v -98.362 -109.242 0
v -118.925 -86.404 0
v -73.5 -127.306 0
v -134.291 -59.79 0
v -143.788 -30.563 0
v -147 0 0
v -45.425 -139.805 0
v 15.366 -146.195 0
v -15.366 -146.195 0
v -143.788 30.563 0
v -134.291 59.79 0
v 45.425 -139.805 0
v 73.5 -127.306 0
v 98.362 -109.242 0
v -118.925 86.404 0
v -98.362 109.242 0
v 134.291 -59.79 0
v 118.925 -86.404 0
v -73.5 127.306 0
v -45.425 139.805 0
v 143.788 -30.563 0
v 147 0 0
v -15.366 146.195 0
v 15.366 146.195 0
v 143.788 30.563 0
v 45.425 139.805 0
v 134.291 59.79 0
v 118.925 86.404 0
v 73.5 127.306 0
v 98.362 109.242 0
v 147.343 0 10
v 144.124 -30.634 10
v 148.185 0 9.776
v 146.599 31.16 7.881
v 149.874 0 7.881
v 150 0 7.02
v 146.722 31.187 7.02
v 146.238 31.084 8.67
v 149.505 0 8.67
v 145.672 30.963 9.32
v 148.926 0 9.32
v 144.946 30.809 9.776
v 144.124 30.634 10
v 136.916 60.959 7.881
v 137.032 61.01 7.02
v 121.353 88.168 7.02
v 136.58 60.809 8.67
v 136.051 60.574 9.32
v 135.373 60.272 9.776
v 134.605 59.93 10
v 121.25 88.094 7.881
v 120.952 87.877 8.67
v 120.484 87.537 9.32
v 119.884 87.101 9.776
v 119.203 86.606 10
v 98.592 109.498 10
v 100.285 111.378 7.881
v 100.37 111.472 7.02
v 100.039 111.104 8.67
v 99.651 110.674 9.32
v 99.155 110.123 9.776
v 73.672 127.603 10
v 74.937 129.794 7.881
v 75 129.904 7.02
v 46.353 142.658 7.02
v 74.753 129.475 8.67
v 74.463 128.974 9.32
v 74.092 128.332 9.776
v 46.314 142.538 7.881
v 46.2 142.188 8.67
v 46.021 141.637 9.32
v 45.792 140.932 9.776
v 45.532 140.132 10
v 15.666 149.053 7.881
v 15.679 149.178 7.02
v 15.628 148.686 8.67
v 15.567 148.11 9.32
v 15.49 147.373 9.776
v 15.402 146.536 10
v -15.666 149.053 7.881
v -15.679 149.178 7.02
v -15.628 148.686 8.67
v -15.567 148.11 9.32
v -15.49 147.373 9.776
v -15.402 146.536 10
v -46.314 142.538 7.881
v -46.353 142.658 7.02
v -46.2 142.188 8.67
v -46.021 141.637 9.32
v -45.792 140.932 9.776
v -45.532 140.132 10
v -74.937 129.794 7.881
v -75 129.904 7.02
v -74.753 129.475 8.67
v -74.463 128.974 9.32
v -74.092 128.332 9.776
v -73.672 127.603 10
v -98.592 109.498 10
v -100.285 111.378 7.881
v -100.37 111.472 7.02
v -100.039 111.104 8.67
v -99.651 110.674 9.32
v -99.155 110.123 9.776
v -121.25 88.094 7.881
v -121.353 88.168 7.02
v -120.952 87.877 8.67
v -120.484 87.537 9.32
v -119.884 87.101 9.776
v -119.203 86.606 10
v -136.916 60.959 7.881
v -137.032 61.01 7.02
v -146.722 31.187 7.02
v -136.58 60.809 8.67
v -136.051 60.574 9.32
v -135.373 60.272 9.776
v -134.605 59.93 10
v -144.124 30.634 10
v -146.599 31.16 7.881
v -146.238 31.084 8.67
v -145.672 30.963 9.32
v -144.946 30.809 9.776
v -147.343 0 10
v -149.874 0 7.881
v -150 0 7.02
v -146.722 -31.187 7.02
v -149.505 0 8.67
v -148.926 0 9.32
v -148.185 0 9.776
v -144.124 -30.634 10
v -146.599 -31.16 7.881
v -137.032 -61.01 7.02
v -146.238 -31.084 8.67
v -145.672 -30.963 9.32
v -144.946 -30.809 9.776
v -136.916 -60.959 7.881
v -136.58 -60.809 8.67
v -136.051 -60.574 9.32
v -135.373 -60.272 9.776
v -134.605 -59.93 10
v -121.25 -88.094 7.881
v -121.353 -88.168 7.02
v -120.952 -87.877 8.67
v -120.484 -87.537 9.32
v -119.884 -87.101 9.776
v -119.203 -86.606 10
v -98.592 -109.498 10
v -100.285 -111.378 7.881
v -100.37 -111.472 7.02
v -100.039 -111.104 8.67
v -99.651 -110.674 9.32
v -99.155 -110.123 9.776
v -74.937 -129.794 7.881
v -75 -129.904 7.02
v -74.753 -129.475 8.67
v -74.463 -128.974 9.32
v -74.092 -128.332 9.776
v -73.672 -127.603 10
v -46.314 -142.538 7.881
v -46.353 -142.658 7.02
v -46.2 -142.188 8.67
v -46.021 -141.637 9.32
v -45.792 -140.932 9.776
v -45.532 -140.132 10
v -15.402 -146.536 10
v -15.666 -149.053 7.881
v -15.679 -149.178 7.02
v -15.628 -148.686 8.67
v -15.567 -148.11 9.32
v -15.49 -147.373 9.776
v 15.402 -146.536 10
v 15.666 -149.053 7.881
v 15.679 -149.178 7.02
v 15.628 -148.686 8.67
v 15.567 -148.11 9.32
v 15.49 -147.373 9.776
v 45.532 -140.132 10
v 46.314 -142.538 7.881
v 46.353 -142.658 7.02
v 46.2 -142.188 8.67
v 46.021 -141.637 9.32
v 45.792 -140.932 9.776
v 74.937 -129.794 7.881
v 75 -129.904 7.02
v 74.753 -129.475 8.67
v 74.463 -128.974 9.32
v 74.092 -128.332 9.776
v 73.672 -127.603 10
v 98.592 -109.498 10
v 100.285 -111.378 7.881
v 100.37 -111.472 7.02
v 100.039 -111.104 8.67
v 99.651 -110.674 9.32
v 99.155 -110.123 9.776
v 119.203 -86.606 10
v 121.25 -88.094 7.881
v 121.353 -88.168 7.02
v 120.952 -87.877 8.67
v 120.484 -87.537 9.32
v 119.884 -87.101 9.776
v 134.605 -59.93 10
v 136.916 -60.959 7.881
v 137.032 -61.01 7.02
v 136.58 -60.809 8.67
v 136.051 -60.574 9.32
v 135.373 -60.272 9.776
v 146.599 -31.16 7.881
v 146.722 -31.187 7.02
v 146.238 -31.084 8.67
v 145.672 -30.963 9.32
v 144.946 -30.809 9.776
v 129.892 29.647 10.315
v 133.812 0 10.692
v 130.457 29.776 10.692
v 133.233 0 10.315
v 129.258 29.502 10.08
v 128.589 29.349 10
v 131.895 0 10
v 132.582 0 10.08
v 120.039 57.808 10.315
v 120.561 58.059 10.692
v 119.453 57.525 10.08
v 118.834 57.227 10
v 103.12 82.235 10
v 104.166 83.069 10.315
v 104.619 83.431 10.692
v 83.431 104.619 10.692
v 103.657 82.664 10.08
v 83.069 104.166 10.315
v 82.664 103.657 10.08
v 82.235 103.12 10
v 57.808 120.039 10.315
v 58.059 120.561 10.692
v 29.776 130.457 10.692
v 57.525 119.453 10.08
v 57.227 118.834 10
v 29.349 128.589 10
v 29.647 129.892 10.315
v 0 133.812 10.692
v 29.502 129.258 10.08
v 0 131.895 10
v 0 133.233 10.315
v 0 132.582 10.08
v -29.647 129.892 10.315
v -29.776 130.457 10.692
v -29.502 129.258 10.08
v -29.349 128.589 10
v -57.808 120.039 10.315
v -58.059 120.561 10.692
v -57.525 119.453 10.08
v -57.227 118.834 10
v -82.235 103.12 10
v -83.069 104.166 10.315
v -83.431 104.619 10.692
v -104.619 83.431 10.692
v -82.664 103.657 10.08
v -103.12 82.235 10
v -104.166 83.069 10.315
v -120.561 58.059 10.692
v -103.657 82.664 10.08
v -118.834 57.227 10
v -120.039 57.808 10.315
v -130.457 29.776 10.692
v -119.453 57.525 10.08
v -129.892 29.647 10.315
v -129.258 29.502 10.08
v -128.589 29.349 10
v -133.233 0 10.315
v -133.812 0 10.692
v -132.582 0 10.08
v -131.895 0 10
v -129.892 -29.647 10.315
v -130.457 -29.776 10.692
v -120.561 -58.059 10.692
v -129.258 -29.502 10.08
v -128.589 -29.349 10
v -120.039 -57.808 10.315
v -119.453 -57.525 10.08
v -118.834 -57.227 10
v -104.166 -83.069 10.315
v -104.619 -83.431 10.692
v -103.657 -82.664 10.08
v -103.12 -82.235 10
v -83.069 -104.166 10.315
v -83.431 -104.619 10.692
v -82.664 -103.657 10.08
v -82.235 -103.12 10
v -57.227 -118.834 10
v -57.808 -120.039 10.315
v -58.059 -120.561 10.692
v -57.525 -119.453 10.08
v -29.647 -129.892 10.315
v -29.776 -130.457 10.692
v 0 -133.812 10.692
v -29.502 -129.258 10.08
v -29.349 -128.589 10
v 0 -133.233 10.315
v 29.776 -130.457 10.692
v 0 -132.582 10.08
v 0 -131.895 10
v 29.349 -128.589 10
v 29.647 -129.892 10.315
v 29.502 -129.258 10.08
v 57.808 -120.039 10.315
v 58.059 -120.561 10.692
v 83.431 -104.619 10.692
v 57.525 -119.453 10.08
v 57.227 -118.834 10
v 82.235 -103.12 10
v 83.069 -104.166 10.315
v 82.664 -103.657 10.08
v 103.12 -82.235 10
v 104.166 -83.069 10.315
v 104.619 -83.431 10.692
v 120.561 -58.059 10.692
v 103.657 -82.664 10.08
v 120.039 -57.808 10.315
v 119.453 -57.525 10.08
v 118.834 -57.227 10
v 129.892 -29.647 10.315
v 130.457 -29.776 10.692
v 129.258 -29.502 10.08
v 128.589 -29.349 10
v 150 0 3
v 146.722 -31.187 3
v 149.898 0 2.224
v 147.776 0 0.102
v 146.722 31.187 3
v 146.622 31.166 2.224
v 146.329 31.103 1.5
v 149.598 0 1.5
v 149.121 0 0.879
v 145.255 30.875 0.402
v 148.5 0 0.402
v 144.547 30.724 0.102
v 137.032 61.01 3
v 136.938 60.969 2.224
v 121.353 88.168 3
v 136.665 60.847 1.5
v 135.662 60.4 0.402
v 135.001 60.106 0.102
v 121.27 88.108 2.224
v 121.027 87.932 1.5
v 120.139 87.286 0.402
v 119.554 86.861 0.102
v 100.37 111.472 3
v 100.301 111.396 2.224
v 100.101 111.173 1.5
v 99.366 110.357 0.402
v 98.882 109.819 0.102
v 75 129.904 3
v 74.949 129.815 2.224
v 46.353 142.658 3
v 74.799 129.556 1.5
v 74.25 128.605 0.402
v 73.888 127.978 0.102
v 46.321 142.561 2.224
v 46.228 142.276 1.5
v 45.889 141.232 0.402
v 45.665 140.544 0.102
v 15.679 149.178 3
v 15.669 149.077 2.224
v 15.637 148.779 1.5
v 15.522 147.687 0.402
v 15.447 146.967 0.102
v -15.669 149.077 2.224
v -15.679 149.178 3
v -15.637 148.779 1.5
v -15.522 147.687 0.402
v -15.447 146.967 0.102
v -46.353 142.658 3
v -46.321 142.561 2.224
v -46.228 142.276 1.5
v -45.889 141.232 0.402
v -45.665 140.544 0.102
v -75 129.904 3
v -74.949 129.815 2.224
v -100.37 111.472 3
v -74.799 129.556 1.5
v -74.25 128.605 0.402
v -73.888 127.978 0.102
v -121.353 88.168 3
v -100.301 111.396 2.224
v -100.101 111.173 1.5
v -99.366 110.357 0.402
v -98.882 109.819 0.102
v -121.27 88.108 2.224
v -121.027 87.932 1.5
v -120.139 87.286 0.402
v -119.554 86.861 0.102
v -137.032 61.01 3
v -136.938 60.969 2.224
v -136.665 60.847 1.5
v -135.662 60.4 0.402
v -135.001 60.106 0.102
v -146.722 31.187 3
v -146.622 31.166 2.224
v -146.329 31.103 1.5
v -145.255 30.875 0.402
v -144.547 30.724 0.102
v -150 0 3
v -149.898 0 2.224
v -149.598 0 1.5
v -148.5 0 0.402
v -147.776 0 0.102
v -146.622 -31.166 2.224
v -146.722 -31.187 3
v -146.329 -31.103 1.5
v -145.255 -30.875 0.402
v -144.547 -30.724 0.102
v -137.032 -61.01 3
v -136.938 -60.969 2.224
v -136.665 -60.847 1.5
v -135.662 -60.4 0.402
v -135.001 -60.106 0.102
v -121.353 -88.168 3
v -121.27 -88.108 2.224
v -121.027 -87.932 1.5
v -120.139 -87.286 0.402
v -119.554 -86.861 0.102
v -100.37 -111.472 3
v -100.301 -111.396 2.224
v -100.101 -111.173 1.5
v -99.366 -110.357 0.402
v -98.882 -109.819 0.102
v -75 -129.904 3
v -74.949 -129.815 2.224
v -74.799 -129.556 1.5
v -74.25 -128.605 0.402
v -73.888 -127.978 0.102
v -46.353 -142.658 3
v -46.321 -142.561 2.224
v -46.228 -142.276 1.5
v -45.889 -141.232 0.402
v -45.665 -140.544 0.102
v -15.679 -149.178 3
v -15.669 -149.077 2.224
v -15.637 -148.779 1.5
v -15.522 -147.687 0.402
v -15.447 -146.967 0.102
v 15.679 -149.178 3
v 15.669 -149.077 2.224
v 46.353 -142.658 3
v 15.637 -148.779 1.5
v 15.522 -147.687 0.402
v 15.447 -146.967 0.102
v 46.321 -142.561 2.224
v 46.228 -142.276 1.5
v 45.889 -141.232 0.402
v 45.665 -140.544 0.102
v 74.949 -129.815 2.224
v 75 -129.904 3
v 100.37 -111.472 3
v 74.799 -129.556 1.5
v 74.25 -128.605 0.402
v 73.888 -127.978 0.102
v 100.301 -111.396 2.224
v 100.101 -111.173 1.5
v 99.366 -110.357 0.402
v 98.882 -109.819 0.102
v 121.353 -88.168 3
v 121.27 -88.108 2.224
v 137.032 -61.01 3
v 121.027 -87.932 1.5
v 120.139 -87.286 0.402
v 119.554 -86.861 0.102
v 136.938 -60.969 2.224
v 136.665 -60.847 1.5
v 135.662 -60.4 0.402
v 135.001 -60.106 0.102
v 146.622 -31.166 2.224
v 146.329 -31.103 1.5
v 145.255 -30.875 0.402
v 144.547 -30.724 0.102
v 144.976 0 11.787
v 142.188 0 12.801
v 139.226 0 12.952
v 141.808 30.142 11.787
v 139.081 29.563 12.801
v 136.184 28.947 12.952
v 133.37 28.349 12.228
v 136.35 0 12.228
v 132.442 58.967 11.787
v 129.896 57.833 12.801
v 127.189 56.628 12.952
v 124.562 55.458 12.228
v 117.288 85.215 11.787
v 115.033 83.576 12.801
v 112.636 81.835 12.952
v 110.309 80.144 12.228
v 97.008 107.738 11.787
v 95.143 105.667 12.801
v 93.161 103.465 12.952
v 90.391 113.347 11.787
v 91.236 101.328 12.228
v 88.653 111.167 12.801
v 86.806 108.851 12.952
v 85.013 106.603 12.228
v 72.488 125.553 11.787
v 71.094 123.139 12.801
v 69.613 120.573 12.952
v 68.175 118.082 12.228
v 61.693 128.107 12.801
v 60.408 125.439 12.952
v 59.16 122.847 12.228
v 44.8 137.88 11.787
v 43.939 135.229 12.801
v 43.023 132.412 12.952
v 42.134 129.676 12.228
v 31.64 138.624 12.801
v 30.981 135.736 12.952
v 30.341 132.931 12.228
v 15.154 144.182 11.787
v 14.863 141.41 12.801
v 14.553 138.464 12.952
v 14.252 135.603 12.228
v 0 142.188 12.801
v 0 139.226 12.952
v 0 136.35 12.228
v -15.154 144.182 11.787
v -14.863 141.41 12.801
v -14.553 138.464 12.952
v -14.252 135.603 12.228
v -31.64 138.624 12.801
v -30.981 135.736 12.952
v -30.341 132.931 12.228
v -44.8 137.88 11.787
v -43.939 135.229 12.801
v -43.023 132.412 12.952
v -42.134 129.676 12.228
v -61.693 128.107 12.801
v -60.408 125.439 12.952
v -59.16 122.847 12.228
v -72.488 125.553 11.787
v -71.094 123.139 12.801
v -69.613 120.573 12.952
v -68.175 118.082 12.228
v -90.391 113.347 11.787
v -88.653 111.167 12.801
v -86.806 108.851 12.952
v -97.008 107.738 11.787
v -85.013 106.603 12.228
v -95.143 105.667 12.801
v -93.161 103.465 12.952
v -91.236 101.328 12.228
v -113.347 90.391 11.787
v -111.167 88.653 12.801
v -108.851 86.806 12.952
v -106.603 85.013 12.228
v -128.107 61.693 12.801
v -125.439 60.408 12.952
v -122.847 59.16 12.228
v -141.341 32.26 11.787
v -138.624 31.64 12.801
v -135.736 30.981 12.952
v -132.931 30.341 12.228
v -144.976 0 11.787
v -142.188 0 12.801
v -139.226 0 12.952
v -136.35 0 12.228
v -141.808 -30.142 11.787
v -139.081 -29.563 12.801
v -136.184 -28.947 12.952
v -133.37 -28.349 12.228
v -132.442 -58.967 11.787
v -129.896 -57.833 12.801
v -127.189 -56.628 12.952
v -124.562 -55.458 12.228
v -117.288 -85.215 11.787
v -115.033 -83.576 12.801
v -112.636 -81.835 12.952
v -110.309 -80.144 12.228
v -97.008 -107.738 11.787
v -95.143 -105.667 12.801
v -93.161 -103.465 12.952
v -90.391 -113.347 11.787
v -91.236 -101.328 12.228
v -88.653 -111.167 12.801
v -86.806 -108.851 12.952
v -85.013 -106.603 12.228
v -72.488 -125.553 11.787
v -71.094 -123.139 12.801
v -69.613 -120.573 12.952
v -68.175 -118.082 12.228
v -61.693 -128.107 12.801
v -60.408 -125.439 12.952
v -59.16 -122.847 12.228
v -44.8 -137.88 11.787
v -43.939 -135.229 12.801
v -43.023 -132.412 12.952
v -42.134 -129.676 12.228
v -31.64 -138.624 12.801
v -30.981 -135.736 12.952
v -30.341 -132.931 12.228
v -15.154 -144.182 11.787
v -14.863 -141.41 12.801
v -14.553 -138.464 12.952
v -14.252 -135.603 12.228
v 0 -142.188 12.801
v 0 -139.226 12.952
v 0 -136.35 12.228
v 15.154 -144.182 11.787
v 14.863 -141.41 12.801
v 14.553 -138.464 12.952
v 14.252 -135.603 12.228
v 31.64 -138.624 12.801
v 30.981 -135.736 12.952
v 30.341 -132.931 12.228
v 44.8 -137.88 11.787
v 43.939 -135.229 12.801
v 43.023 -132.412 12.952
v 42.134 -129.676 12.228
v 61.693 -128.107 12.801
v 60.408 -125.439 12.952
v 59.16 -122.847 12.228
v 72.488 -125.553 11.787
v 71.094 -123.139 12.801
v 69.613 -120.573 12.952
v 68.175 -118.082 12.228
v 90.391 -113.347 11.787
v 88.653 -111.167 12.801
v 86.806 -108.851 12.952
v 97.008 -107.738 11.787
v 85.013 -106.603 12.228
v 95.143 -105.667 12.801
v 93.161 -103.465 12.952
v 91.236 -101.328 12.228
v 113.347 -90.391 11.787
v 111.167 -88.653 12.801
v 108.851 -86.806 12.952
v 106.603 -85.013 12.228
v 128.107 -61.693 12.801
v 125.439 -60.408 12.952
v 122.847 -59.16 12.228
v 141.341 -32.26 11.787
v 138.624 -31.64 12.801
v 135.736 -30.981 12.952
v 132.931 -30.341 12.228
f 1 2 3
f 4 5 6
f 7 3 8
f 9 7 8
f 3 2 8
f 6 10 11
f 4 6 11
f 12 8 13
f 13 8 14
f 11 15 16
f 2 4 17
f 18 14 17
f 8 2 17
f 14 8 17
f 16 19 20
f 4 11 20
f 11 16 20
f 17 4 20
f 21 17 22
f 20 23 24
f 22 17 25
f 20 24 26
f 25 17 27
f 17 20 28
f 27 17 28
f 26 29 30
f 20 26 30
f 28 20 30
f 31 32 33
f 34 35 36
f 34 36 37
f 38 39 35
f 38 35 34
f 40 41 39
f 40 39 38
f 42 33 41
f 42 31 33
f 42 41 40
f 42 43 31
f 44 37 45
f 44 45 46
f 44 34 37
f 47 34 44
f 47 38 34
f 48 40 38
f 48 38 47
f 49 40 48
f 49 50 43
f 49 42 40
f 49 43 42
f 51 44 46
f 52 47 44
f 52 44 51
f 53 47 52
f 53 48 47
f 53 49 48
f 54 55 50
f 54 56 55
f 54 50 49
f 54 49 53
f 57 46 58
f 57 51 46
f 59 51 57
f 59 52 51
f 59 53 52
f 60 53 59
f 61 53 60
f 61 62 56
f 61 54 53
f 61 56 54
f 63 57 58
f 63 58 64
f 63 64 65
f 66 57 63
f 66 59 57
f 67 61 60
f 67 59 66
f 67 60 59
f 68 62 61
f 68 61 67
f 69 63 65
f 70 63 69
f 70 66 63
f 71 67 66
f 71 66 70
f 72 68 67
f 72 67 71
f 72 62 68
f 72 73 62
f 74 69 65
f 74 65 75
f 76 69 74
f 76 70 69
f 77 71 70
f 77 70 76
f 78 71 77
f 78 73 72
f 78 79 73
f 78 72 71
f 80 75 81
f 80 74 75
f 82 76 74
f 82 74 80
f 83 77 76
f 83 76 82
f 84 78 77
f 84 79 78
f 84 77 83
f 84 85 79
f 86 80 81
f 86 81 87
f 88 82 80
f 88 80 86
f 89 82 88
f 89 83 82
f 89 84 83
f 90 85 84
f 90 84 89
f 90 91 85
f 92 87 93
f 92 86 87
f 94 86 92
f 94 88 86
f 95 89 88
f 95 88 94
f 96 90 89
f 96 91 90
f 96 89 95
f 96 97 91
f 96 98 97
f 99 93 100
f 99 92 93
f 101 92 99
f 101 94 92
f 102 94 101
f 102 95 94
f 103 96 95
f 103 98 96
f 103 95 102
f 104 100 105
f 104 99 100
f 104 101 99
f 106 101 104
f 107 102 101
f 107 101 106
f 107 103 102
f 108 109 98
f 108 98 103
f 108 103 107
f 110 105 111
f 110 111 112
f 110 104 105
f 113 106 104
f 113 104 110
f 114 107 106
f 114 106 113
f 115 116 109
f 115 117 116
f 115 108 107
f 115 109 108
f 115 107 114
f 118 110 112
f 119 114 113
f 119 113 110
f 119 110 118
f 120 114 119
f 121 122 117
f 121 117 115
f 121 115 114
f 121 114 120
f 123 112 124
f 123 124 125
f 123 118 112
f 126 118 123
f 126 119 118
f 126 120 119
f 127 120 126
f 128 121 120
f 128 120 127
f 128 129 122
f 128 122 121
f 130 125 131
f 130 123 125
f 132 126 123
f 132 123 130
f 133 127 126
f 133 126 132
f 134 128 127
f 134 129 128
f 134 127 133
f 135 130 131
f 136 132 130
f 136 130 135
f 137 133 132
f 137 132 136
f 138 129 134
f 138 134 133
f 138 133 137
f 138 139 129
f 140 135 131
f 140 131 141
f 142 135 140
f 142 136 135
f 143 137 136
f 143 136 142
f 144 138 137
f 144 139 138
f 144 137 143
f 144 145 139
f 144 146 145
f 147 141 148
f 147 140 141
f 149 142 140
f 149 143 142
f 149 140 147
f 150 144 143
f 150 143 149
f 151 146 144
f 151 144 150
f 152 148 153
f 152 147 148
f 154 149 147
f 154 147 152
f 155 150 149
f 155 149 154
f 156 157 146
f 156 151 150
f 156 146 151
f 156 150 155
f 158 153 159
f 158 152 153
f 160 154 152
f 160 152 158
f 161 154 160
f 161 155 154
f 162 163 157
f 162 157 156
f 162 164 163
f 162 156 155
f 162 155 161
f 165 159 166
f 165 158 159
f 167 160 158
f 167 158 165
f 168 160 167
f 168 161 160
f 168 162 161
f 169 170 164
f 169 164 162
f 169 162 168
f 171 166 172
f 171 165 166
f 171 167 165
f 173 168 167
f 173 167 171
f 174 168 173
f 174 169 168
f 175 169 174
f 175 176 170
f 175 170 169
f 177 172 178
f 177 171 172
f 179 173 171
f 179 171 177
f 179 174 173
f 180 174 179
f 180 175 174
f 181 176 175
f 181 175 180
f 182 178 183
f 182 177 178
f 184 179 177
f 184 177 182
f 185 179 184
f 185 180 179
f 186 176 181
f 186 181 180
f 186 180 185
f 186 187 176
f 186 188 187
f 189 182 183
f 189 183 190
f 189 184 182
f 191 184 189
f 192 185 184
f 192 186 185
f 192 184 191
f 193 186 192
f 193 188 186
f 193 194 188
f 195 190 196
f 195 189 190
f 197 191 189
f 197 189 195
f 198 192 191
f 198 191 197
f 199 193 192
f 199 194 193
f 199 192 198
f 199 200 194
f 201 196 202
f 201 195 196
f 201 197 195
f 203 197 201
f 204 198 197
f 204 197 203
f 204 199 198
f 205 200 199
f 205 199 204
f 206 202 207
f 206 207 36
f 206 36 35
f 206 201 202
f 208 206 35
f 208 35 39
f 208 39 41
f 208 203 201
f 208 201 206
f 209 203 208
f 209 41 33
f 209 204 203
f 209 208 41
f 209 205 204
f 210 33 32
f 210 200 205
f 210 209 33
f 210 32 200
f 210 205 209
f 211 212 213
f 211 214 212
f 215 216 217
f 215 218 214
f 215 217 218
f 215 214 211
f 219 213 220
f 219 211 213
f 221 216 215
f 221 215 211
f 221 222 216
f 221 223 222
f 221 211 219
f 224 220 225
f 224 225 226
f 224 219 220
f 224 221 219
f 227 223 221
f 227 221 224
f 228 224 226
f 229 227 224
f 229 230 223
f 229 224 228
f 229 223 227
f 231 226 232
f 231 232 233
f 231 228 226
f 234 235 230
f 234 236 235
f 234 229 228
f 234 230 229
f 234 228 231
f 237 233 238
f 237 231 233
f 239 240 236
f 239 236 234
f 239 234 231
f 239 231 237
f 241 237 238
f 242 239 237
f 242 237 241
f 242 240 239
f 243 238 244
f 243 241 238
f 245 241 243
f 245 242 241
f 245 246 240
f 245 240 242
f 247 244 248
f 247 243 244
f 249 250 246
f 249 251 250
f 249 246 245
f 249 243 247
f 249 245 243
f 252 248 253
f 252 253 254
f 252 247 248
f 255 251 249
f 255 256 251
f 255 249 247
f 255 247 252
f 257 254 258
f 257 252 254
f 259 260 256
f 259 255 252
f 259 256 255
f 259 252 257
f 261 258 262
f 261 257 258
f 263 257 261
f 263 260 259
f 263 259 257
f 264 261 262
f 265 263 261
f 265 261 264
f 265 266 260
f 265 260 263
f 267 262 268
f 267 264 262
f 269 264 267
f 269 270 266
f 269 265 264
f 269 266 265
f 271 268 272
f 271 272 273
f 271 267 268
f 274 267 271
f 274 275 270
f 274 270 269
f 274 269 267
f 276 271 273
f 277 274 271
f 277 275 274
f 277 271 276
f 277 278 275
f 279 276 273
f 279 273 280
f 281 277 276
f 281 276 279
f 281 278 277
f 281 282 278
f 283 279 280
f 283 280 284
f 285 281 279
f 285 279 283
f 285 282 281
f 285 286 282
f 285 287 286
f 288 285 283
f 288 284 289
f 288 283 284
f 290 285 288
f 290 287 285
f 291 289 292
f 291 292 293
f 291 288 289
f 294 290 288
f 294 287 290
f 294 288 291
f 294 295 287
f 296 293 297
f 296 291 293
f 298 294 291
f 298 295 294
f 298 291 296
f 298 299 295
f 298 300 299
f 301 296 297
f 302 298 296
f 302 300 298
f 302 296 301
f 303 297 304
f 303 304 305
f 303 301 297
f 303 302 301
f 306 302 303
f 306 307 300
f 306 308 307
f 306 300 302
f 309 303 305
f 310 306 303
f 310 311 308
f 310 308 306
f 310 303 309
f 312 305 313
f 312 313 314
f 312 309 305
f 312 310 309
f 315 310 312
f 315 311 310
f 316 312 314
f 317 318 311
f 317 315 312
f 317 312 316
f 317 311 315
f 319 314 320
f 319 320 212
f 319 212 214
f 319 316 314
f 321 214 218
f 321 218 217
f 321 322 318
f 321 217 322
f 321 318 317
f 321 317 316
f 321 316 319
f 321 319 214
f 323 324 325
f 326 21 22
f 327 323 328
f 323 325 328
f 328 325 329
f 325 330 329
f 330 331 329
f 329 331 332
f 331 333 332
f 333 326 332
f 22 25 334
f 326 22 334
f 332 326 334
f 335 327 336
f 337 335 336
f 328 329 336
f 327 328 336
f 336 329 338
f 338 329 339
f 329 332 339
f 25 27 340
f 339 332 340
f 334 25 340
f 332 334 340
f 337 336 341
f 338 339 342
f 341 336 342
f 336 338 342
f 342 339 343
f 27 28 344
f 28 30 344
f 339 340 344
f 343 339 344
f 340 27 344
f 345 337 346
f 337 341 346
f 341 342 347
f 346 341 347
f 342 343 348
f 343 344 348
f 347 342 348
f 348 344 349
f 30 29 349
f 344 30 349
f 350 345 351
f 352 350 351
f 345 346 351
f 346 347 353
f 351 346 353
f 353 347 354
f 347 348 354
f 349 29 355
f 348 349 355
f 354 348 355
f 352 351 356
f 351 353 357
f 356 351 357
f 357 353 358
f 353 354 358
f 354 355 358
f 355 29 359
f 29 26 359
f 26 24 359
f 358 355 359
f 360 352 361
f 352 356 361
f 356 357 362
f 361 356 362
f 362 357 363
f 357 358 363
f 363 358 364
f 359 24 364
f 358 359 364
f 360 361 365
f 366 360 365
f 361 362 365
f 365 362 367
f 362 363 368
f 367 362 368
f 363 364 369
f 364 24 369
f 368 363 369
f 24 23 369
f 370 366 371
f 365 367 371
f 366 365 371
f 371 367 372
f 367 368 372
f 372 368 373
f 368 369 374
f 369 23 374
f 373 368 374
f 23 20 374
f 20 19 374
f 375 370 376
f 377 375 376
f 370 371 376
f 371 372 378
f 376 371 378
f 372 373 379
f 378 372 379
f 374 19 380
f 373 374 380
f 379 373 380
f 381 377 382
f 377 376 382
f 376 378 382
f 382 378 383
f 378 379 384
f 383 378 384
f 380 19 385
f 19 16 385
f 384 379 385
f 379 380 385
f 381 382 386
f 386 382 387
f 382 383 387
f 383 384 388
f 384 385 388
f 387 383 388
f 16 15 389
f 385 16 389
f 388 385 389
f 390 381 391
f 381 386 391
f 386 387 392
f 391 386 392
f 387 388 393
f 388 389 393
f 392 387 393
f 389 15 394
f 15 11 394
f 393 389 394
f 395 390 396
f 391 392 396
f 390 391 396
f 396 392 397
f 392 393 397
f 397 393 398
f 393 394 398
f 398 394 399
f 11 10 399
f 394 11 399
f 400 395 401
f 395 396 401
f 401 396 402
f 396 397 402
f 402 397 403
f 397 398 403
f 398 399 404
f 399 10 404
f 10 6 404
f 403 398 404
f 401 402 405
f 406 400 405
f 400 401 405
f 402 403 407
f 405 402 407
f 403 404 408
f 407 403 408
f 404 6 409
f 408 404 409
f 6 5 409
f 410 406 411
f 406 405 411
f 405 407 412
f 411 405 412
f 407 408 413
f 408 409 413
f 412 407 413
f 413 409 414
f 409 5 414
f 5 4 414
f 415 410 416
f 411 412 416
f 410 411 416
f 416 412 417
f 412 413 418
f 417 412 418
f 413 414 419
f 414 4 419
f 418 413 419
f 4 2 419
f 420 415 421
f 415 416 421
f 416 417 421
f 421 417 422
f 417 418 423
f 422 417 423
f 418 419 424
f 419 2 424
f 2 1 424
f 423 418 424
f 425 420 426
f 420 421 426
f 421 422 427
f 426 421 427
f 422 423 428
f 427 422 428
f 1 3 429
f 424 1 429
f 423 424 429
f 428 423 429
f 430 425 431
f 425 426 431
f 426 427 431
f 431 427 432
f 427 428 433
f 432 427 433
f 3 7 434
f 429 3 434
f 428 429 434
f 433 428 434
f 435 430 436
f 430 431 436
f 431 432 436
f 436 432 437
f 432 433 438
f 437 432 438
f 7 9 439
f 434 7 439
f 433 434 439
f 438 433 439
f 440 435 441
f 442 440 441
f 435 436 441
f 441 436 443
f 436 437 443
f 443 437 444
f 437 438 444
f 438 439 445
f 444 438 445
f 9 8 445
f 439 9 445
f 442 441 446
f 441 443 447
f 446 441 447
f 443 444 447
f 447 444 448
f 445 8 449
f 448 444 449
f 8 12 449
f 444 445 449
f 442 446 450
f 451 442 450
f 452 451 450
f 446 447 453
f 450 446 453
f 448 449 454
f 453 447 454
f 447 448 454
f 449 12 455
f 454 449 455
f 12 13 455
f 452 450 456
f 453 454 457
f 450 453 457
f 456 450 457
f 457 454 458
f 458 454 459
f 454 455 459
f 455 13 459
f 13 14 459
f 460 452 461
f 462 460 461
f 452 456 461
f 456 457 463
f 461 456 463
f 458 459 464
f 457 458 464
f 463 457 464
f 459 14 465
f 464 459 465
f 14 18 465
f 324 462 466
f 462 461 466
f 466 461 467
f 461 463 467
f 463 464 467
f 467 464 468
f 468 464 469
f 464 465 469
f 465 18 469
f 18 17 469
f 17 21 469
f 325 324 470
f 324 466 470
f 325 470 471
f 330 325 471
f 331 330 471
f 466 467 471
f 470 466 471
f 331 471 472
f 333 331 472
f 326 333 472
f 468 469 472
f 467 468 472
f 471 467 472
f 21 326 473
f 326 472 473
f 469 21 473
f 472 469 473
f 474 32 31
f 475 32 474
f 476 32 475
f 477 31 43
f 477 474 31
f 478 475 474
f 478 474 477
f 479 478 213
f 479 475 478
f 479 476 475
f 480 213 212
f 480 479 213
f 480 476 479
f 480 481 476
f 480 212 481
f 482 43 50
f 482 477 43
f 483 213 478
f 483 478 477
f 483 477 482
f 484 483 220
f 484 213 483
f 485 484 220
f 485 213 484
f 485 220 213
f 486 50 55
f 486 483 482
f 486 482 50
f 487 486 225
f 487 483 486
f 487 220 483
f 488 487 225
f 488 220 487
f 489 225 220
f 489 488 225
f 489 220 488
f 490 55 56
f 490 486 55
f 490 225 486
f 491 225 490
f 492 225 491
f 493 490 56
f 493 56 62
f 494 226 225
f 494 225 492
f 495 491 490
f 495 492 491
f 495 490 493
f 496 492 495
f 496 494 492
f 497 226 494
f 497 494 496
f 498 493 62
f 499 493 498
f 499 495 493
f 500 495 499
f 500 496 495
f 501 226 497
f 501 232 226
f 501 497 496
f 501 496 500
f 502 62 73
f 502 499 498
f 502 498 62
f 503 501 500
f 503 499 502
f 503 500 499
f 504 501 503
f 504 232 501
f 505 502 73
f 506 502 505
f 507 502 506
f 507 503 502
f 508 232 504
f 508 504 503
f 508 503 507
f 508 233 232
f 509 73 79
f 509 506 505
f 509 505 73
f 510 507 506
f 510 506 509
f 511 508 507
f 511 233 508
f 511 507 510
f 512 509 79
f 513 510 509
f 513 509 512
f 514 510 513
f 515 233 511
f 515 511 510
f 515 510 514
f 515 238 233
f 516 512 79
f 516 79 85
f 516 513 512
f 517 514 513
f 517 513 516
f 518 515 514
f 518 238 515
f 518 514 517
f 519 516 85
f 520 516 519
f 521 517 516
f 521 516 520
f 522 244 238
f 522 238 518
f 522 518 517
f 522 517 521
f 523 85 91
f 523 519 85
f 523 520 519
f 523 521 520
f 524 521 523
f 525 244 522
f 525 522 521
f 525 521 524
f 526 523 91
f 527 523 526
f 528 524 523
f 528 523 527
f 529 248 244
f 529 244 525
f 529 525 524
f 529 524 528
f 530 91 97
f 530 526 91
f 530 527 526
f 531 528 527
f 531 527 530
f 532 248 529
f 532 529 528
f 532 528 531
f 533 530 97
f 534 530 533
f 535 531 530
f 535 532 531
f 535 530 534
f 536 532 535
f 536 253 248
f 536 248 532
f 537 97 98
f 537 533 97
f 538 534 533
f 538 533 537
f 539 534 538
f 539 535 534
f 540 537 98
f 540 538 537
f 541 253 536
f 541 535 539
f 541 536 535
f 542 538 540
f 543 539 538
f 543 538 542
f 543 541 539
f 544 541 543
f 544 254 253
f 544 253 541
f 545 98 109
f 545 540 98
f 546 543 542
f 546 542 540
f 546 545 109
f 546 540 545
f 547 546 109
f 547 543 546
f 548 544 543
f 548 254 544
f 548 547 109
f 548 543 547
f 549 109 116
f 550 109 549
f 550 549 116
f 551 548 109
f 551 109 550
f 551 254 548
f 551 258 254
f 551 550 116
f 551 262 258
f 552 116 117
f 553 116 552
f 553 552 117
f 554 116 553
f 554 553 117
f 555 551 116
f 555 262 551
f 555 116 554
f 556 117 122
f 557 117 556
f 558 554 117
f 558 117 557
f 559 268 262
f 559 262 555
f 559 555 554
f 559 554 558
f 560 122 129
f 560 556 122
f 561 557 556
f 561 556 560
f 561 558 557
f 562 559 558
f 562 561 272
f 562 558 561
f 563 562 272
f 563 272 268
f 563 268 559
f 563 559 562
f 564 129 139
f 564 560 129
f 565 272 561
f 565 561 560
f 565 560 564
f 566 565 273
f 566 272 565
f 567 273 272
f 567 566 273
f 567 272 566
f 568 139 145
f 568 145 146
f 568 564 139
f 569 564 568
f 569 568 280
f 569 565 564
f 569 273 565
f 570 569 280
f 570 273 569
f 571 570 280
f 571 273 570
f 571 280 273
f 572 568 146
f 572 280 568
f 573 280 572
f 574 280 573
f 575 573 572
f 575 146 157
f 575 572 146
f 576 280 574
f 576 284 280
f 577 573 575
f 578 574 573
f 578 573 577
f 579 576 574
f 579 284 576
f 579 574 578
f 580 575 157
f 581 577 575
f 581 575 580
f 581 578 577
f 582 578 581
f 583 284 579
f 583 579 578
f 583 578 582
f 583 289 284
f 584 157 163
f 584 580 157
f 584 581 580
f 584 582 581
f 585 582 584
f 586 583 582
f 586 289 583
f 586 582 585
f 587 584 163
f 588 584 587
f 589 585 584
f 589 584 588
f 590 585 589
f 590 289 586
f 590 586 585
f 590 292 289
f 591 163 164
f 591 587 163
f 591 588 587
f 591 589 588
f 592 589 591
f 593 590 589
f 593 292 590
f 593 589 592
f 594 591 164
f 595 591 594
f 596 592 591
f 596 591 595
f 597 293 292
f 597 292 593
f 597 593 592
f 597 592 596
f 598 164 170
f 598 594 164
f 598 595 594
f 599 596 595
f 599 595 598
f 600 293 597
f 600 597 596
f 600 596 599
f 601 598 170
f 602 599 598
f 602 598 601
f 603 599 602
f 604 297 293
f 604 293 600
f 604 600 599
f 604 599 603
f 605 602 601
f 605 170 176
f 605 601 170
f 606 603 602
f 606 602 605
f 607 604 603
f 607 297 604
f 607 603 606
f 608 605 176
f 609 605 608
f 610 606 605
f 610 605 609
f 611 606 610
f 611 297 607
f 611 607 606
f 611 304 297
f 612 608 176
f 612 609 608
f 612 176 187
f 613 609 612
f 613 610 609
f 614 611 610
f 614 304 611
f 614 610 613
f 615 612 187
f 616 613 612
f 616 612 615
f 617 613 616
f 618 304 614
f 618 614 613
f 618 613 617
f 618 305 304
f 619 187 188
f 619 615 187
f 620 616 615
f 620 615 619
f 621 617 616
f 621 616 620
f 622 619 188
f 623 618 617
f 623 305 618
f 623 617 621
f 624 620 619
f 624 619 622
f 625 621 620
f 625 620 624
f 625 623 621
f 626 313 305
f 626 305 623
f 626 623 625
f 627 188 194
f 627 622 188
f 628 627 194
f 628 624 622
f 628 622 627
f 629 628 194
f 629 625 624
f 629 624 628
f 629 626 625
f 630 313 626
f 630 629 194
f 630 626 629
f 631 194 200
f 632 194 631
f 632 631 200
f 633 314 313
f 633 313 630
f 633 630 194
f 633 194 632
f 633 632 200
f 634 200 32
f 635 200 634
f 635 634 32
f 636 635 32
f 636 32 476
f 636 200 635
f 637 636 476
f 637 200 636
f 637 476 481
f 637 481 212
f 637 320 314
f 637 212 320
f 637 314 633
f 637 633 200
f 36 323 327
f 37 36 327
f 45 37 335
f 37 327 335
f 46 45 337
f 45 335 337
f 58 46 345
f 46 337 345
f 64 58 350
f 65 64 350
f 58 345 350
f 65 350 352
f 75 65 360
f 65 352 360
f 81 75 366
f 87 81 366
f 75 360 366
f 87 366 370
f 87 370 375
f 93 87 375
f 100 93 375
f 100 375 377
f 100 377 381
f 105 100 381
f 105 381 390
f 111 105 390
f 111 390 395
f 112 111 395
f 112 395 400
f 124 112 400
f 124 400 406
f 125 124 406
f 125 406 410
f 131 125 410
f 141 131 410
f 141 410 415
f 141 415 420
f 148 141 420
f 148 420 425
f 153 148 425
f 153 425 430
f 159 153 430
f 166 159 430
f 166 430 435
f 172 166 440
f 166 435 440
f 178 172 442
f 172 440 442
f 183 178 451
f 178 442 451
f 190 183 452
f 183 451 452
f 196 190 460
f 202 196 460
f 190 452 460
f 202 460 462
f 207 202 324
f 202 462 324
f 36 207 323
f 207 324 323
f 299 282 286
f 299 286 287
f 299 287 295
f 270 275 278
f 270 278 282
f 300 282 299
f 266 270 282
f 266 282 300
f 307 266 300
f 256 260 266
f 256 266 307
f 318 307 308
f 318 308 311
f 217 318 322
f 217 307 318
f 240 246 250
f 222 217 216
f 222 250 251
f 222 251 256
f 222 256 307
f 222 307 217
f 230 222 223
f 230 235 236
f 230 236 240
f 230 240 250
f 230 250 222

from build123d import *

# Parameters (mm, degrees)
F0_R     = 150
F1_DEPTH = 10


# Not quite as in the source:
# - a fillet or chamfer that OpenCascade refuses, or shapes differently, is made with other operations: its cross-section is extruded or revolved along the edge and cut away or added


with BuildPart() as f1:
    # F0 (on Top) → F1 (new body)
    with BuildSketch(Plane.XY):
        Circle(F0_R)
    extrude(amount=F1_DEPTH)

    # F2 (on Front) → F3 (revolve)
    with BuildSketch(Plane.XZ):
        with BuildLine():
            Line((130.4040820577, 5), (150, 5))
            ThreePointArc((150, 5), (140.2020410289, 13), (130.4040820577, 5))
        make_face()
    revolve(axis=Axis((0, 0, 19.3104613572), (0, 0, 1)))

    # F4: fillet of radius 3 on 4 edges, made by hand

    # F4_s1 → F4_t2 (revolve)
    with BuildSketch(Plane.XZ):
        with BuildLine():
            ThreePointArc((133.8123303651, 10.6923076923), (132.9144664967, 10.1783801706), (131.8954171659, 10))
            Line((131.8954171659, 10), (133.0606126003, 10))
            ThreePointArc((133.0606126003, 10), (133.4276219564, 10.3557627905), (133.8123303651, 10.6923076923))
        make_face()
    revolve(axis=Axis((0, 0, 10), (0, 0, 1)))

    # F4_s3 → F4_t4 (revolve, cut)
    with BuildSketch(Plane.XZ):
        with BuildLine():
            ThreePointArc((150, 3), (149.1213203436, 0.8786796564), (147, 0))
            Line((147, 0), (150, 0))
            Line((150, 0), (150, 3))
        make_face()
    revolve(axis=Axis((0, 0, 0), (0, 0, 1)), mode=Mode.SUBTRACT)

    # F4_s5 → F4_t6 (revolve, cut)
    with BuildSketch(Plane.XZ):
        with BuildLine():
            ThreePointArc((150, 7.0197267354), (149.2394651563, 9.01592207), (147.3434694574, 10))
            Line((147.3434694574, 10), (150, 10))
            Line((150, 10), (150, 7.0197267354))
        make_face()
    revolve(axis=Axis((0, 0, 10), (0, 0, 1)), mode=Mode.SUBTRACT)


solid = f1.part
